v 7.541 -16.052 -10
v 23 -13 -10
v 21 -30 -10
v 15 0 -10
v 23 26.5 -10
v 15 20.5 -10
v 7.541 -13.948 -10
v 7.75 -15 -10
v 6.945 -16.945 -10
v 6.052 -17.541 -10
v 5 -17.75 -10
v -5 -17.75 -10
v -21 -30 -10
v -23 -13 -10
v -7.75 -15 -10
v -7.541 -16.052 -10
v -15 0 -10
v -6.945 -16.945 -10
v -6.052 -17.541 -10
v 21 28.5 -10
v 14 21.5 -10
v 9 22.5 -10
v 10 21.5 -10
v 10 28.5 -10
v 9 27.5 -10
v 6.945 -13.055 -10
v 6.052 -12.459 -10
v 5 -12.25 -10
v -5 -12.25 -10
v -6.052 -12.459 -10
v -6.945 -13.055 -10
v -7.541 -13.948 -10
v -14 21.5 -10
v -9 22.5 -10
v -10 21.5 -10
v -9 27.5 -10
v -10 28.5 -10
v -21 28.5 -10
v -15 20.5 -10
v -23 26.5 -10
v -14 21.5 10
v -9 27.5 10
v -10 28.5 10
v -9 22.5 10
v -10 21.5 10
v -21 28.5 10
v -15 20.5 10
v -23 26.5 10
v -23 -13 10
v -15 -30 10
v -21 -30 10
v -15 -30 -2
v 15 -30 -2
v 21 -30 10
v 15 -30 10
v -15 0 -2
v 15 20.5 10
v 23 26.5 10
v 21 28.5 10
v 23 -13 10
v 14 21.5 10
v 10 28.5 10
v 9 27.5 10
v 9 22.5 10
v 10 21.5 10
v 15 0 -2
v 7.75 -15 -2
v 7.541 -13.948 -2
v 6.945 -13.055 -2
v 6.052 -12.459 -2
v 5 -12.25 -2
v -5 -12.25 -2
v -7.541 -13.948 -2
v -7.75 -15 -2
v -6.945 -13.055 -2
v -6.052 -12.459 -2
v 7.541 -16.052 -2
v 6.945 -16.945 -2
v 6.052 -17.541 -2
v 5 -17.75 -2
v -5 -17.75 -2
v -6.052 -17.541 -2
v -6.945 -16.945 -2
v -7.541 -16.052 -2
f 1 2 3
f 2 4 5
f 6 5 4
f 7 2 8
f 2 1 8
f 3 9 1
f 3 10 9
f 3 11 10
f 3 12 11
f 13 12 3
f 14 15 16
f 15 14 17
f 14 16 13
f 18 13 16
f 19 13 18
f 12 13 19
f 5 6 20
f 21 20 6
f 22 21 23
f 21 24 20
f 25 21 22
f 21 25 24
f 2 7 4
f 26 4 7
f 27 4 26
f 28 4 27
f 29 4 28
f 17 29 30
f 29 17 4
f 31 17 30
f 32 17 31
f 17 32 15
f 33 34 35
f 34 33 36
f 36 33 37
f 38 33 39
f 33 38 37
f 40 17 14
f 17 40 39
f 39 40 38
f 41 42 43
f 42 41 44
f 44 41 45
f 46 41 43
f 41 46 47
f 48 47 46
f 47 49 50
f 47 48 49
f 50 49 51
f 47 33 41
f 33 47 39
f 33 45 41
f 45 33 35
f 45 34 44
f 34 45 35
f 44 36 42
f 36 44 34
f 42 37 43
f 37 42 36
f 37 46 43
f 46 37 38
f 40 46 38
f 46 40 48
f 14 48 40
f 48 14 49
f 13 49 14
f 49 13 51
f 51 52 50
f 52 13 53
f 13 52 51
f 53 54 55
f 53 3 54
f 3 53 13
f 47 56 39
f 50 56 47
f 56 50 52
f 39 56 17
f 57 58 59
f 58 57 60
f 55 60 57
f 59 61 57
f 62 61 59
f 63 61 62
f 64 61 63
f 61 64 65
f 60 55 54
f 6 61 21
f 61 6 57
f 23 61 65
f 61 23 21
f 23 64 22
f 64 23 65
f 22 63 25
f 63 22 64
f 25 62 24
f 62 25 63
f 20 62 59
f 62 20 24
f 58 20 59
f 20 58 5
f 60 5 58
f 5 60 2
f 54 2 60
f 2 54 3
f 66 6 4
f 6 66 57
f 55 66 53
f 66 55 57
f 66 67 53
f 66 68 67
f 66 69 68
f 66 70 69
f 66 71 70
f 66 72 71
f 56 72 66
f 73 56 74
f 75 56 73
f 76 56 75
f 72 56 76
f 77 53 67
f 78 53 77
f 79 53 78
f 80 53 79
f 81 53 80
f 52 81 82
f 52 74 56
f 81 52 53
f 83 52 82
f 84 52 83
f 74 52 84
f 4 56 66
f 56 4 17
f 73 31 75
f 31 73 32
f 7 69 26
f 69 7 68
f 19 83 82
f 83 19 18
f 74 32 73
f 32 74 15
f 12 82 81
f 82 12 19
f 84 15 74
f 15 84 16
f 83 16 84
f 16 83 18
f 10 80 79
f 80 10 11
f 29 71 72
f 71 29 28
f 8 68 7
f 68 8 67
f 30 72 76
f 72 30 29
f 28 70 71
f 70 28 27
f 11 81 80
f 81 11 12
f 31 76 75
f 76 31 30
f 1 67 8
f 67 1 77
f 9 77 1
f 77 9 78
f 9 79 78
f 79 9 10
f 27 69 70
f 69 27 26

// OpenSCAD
// eLKa1
// omega2
// GNU GPL v3
// lkiefer <blog.lkiefer.org> and contributors
// http://www.reprap.org/wiki/ELKa
// https://github.com/kimented/elka1

ep=8;       // épaisseur
diam=5.5;   // diamètre des trous
pro=30;     // profilé
lar=20;     // largeur
ch=2;       // chanfrein
ch2=1;      // chanfrein pointe
ra=7;       // largeur rainure
ra2=6;      // profondeur rainure
ob=10;      // entraxe trou oblong
ec=10;      // ecart entre les profilés

module patte () {
translate([-pro/2,0,0])
linear_extrude(height=lar, center=true, convexity=10)
  polygon([[0,-pro],[0,pro/2+ec-ra/2-ch2],[0+ch2,pro/2+ec-ra/2],[ra2-ch2,pro/2+ec-ra/2],[ra2,pro/2+ec-ra/2+ch2],[ra2,pro/2+ec+ra/2-ch2],[ra2-ch2,pro/2+ec+ra/2],[-ep+ch,pro/2+ec+ra/2],[-ep,pro/2+ec+ra/2-ch],[-ep,-pro/2+ch],[-ep+ch,-pro]]);
}

difference(){
  union(){
    patte();
    scale([-1,1,1]) patte();
    translate([-pro/2,-pro,-lar/2]) cube([pro, pro, ep]);
  }
  hull(){
    translate([ob/2,-pro/2,-lar/2-1]) cylinder(d=diam, h=lar+2, $fn=16);
    translate([-ob/2,-pro/2,-lar/2-1]) cylinder(d=diam, h=lar+2, $fn=16);
}
}
